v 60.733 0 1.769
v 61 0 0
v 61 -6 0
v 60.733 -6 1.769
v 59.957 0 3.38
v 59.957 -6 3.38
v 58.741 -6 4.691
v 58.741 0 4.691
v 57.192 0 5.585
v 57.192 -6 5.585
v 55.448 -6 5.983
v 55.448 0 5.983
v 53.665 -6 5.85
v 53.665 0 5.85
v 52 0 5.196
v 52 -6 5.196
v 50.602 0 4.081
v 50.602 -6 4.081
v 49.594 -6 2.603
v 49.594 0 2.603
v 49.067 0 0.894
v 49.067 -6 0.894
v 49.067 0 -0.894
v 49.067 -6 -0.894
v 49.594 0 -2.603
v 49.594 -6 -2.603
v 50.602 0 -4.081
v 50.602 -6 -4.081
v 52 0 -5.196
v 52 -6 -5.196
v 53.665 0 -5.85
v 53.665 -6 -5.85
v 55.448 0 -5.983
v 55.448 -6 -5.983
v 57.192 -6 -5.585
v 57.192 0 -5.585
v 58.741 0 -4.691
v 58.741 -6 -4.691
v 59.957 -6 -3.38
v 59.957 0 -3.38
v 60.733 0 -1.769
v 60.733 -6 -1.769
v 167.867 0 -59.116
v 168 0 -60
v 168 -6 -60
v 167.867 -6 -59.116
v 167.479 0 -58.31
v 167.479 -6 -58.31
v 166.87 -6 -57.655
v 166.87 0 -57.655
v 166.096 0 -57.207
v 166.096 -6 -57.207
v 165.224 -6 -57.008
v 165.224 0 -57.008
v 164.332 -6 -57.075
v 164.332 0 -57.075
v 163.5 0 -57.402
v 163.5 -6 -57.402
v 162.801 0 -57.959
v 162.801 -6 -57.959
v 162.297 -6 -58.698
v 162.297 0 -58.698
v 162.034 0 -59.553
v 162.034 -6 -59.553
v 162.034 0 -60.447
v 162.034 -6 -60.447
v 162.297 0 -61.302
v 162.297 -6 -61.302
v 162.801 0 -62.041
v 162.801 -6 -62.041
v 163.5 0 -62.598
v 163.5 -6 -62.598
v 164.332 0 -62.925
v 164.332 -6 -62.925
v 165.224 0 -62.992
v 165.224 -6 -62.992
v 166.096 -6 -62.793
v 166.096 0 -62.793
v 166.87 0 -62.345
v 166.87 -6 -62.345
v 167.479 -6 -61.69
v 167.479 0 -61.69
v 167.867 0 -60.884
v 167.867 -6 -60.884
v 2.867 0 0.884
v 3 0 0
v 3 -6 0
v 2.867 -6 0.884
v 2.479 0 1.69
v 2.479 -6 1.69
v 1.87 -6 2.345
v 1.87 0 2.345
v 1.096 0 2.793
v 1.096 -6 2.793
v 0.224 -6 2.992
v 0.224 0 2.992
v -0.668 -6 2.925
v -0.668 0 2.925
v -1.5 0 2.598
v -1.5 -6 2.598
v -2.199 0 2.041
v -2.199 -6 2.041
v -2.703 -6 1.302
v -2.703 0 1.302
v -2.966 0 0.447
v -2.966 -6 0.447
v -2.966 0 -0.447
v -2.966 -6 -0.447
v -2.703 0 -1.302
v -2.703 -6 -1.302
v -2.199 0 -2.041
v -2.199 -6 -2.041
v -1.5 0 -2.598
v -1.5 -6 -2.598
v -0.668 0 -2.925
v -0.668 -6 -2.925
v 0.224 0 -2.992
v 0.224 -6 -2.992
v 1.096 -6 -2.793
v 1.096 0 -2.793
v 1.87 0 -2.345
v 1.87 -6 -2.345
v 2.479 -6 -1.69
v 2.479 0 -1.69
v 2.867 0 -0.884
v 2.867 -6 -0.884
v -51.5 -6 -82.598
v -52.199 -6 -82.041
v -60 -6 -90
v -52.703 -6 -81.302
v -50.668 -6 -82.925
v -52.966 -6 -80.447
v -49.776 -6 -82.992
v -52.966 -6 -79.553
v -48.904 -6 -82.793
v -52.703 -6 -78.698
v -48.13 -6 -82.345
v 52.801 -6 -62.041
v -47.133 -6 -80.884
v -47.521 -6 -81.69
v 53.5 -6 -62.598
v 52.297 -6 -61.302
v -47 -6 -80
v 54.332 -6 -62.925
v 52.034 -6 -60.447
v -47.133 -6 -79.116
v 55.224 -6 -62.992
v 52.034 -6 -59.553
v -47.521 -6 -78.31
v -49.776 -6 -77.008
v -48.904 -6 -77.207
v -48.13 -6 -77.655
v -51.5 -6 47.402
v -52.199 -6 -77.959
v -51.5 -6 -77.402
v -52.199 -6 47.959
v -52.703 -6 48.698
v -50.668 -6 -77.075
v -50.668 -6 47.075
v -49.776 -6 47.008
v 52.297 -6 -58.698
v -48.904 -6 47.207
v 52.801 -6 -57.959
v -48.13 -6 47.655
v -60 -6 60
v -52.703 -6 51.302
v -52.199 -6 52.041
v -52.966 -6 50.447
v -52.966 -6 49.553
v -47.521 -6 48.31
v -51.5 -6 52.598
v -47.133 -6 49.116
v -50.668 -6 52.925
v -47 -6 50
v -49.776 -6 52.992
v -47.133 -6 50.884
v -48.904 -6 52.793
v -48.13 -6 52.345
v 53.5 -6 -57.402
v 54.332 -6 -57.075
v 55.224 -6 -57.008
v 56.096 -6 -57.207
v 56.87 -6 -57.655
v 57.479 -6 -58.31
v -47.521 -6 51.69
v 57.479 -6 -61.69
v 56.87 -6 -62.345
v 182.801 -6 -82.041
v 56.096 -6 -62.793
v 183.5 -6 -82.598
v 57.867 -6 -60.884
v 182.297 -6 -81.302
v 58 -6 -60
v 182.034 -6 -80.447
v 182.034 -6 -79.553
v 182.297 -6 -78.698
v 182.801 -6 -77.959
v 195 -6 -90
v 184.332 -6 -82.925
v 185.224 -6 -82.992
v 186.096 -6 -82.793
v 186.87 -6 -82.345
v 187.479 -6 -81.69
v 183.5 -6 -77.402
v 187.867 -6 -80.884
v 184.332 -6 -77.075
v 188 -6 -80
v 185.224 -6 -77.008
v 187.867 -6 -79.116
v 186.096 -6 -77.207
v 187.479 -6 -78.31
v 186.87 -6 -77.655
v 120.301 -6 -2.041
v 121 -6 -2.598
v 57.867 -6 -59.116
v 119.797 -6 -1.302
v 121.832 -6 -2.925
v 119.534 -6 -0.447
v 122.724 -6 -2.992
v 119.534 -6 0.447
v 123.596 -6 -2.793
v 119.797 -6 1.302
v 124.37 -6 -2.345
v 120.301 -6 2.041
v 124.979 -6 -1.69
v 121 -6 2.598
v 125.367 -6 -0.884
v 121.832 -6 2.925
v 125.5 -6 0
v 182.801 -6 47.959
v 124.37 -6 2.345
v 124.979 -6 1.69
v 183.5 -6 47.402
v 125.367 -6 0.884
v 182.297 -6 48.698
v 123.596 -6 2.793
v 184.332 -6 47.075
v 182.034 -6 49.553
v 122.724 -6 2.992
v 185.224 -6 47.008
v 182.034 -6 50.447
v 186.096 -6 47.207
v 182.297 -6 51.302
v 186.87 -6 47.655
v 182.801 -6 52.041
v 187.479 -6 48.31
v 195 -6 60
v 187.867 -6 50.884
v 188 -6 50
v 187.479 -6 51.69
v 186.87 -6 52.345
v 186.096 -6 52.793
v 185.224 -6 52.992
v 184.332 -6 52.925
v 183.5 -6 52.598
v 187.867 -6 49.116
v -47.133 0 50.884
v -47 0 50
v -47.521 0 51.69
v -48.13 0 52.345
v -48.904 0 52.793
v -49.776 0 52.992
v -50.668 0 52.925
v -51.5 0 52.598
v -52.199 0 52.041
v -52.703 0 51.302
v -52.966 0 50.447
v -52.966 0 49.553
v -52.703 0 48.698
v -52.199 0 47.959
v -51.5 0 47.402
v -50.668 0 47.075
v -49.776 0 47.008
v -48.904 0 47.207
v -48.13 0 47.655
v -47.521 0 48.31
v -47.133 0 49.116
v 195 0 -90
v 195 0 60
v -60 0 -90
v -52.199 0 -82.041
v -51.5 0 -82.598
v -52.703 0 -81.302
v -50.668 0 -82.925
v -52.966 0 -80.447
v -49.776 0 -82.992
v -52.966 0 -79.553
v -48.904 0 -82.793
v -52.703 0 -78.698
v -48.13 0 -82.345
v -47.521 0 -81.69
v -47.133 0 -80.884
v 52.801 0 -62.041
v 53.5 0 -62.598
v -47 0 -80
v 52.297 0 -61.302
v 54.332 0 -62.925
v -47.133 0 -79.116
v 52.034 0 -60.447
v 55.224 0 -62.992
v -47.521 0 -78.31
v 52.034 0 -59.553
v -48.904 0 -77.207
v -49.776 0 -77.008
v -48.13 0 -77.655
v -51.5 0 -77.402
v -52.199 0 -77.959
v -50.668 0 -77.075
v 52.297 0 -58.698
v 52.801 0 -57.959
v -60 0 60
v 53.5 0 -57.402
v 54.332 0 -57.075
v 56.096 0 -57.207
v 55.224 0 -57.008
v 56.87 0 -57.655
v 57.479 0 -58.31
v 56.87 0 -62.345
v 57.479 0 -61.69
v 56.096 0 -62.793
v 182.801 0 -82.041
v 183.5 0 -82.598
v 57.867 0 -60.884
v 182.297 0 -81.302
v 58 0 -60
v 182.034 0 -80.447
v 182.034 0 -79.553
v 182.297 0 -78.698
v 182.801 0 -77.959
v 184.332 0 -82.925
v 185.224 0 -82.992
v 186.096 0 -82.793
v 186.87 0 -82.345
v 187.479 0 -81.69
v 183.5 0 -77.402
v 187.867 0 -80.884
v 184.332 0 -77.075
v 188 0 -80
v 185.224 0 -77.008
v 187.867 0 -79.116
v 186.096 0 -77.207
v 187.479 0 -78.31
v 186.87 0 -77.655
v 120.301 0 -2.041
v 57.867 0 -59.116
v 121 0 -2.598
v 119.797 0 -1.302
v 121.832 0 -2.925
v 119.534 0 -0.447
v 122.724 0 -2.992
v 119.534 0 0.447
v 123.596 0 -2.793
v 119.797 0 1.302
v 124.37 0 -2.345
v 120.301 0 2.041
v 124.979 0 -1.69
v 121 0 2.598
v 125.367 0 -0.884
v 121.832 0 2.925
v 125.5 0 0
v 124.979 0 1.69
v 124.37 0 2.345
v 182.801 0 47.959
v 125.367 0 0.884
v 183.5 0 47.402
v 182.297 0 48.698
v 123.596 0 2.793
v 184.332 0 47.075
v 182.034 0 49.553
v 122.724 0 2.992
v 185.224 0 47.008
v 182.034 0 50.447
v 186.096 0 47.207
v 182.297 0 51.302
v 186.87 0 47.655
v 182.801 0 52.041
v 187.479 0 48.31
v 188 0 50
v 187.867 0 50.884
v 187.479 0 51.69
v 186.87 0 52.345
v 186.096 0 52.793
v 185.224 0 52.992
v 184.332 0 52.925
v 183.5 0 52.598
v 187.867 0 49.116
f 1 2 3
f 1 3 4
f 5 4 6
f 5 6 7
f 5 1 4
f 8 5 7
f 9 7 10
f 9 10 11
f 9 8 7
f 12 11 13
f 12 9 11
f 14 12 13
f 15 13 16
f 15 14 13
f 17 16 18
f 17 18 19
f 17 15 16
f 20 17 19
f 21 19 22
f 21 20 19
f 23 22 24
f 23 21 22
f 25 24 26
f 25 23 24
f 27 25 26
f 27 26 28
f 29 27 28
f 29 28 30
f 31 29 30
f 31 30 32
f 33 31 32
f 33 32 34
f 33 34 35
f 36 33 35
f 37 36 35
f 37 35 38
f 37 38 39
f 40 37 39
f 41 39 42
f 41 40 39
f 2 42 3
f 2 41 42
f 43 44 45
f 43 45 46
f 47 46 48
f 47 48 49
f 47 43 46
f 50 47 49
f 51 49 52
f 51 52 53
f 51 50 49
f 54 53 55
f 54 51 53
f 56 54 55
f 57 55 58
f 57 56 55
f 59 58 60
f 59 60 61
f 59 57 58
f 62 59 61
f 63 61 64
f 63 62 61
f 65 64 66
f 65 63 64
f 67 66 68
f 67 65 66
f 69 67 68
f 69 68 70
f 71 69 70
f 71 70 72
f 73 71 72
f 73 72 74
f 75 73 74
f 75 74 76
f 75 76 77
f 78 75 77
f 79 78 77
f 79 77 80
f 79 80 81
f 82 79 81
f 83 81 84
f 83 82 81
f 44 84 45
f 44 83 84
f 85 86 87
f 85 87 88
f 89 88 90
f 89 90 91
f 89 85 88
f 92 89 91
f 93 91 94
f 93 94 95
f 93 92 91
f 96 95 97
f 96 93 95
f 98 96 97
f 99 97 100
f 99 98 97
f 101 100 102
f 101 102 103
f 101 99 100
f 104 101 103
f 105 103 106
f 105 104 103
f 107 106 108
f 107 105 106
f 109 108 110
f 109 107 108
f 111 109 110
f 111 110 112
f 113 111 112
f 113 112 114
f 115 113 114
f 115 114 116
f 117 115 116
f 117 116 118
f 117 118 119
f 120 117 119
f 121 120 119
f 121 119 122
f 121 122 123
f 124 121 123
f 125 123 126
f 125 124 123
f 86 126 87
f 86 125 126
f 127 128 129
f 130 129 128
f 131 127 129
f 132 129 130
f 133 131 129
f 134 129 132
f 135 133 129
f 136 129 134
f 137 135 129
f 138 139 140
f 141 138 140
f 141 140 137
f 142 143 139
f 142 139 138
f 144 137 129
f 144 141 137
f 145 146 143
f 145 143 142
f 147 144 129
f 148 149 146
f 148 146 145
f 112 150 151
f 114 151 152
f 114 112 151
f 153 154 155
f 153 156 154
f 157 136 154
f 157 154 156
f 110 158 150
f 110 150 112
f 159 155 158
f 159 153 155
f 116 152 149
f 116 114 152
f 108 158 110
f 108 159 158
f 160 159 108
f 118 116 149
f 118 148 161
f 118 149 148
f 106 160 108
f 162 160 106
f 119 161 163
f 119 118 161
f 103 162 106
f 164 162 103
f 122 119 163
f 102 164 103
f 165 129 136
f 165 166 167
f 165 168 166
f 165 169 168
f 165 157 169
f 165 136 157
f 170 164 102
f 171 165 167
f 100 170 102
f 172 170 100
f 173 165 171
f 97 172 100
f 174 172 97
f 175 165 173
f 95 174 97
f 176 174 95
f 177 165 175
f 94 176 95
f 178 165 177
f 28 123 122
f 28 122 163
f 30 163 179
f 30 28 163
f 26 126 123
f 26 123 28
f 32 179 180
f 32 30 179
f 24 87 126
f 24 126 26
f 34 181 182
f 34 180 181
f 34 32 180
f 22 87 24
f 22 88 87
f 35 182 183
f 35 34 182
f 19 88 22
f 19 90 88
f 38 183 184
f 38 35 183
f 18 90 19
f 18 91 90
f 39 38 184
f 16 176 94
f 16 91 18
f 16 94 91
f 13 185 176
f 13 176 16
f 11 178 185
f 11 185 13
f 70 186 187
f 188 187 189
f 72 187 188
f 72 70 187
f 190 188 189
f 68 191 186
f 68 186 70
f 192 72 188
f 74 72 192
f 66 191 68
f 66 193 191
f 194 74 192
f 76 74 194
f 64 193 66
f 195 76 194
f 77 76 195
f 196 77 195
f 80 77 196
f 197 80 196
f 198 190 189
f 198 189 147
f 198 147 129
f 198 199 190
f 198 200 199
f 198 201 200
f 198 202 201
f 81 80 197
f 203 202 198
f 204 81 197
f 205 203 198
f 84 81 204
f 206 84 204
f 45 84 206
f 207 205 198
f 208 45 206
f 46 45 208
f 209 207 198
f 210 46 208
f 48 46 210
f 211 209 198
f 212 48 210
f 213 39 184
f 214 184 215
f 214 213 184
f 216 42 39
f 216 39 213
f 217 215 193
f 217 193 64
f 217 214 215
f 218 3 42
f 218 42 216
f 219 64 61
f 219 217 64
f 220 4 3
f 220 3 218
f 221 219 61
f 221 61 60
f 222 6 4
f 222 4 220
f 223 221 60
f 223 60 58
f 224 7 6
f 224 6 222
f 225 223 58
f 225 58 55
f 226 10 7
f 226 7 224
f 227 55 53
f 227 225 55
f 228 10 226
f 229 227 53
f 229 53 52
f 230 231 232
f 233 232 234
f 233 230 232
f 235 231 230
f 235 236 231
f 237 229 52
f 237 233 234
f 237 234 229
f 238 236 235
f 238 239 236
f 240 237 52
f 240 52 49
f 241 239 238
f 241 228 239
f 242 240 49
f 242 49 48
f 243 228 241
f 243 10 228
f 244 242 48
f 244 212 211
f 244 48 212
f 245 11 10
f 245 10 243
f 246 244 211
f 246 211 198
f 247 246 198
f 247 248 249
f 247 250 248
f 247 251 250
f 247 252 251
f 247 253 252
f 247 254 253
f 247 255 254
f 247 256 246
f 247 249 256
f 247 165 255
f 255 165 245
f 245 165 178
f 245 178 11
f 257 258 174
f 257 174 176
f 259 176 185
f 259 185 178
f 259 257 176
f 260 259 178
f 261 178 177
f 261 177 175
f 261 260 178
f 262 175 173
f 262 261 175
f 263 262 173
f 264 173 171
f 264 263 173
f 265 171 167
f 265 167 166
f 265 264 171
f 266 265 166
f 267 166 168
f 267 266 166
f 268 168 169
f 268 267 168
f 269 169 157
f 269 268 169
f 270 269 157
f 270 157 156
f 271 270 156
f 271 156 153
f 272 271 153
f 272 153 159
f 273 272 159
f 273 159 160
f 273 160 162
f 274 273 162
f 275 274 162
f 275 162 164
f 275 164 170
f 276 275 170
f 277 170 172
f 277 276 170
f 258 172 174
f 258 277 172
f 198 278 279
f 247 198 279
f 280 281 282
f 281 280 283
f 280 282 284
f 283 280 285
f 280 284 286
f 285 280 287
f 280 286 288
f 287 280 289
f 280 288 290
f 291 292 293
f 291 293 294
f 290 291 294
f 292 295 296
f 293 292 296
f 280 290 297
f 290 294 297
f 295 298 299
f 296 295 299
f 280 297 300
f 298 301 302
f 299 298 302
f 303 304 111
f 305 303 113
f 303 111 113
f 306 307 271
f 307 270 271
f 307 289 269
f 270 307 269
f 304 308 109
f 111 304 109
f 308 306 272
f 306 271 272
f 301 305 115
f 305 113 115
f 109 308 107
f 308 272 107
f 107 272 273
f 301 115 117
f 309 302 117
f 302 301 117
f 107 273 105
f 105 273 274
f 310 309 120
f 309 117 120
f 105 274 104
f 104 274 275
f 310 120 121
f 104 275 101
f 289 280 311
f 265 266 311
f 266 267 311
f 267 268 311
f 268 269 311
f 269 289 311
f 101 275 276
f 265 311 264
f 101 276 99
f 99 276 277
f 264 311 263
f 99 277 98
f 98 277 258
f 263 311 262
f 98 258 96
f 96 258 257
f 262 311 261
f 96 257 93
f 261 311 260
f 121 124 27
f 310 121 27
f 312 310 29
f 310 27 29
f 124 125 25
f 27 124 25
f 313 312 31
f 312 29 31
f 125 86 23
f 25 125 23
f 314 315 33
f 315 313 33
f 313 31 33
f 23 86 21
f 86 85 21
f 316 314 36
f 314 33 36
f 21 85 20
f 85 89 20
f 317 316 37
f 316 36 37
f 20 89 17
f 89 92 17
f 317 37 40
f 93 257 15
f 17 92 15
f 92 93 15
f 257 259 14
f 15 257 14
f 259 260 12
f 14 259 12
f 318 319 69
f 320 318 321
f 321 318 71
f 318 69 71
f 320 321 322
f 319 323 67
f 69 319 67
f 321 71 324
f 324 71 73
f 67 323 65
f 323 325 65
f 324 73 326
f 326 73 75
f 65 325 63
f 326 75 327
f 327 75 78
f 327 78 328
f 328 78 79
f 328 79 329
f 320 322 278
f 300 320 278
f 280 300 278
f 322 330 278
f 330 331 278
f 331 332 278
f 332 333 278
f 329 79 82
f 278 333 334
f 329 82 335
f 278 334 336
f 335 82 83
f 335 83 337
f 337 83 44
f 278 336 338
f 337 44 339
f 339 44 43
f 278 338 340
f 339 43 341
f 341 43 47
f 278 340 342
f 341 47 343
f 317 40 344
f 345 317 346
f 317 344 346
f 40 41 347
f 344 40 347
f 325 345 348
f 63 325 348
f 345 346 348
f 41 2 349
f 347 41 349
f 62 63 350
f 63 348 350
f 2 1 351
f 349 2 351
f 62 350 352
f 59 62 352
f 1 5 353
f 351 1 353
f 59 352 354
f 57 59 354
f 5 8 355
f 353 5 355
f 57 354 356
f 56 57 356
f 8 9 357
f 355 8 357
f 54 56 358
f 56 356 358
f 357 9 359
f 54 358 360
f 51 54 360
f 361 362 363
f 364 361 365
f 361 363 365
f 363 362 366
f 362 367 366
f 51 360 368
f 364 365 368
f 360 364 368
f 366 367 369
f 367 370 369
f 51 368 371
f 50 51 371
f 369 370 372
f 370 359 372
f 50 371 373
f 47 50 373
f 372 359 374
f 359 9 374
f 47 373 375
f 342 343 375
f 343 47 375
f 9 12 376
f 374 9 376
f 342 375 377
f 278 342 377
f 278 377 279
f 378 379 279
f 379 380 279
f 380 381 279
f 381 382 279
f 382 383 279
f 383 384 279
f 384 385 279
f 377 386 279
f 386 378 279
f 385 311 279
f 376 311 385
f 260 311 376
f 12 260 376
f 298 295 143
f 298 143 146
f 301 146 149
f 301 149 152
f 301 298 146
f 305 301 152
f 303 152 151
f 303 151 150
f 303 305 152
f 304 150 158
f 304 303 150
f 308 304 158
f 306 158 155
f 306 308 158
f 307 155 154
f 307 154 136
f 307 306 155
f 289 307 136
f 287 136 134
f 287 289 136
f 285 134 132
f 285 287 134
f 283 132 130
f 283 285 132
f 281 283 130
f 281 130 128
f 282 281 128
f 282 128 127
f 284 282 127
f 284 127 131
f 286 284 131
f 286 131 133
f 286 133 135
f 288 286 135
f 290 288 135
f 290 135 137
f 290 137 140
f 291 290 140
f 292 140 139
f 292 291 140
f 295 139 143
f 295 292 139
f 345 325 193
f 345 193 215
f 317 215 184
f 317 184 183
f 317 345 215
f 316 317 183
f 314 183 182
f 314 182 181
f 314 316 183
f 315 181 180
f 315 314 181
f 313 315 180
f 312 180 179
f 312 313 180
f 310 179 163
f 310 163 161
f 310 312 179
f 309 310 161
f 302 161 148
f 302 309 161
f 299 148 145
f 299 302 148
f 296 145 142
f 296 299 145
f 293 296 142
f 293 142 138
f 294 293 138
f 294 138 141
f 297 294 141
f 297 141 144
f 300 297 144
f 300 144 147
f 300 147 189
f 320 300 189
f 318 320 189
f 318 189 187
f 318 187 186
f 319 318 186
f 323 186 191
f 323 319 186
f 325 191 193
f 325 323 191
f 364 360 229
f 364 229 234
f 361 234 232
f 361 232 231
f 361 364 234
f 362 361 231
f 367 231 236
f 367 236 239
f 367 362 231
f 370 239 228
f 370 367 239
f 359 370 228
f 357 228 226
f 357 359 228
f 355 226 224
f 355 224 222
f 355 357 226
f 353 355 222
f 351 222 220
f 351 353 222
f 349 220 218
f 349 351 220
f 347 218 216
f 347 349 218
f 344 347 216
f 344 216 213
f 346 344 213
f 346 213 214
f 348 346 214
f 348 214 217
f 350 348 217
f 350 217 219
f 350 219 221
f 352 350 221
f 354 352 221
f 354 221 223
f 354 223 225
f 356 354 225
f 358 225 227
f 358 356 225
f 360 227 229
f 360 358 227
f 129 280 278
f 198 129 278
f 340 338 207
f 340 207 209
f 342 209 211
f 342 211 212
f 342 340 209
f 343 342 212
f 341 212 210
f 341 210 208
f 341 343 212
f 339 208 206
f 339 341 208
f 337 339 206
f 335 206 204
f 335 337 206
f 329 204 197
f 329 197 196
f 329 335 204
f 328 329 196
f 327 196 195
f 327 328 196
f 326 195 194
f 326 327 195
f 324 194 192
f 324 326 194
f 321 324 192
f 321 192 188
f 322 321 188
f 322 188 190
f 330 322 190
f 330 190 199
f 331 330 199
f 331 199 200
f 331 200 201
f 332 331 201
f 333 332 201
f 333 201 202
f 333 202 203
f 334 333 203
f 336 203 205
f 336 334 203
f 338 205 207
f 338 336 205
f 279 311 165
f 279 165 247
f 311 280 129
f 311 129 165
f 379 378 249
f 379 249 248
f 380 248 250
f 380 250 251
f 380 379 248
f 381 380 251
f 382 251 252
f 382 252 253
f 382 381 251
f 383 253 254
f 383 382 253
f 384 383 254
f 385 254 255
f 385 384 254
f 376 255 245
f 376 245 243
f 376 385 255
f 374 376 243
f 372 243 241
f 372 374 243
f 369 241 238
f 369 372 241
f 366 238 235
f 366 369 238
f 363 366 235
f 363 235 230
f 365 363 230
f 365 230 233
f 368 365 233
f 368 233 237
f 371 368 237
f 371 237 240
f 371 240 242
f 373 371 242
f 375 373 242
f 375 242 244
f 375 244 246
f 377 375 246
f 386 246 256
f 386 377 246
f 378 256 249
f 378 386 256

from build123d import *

# Parameters (mm, degrees)
F0_W     = 255
F0_H     = 150
F0_R     = 3
F0_R_2   = 6
F1_DEPTH = 6


with BuildPart() as f1:
    # F0 (on Front) → F1 (new body)
    with BuildSketch(Plane.XZ):
        with Locations((67.5, -15)):
            Rectangle(F0_W, F0_H)
        with Locations((-50, -80)):
            Circle(F0_R, mode=Mode.SUBTRACT)
        with Locations((55, -60)):
            Circle(F0_R, mode=Mode.SUBTRACT)
        with Locations((185, -80)):
            Circle(F0_R, mode=Mode.SUBTRACT)
        with Locations((165, -60)):
            Circle(F0_R, mode=Mode.SUBTRACT)
        Circle(F0_R, mode=Mode.SUBTRACT)
        with Locations((55, 0)):
            Circle(F0_R_2, mode=Mode.SUBTRACT)
        with Locations((-50, 50)):
            Circle(F0_R, mode=Mode.SUBTRACT)
        with Locations((122.5, 0)):
            Circle(F0_R, mode=Mode.SUBTRACT)
        with Locations((185, 50)):
            Circle(F0_R, mode=Mode.SUBTRACT)
    extrude(amount=F1_DEPTH)


solid = f1.part
